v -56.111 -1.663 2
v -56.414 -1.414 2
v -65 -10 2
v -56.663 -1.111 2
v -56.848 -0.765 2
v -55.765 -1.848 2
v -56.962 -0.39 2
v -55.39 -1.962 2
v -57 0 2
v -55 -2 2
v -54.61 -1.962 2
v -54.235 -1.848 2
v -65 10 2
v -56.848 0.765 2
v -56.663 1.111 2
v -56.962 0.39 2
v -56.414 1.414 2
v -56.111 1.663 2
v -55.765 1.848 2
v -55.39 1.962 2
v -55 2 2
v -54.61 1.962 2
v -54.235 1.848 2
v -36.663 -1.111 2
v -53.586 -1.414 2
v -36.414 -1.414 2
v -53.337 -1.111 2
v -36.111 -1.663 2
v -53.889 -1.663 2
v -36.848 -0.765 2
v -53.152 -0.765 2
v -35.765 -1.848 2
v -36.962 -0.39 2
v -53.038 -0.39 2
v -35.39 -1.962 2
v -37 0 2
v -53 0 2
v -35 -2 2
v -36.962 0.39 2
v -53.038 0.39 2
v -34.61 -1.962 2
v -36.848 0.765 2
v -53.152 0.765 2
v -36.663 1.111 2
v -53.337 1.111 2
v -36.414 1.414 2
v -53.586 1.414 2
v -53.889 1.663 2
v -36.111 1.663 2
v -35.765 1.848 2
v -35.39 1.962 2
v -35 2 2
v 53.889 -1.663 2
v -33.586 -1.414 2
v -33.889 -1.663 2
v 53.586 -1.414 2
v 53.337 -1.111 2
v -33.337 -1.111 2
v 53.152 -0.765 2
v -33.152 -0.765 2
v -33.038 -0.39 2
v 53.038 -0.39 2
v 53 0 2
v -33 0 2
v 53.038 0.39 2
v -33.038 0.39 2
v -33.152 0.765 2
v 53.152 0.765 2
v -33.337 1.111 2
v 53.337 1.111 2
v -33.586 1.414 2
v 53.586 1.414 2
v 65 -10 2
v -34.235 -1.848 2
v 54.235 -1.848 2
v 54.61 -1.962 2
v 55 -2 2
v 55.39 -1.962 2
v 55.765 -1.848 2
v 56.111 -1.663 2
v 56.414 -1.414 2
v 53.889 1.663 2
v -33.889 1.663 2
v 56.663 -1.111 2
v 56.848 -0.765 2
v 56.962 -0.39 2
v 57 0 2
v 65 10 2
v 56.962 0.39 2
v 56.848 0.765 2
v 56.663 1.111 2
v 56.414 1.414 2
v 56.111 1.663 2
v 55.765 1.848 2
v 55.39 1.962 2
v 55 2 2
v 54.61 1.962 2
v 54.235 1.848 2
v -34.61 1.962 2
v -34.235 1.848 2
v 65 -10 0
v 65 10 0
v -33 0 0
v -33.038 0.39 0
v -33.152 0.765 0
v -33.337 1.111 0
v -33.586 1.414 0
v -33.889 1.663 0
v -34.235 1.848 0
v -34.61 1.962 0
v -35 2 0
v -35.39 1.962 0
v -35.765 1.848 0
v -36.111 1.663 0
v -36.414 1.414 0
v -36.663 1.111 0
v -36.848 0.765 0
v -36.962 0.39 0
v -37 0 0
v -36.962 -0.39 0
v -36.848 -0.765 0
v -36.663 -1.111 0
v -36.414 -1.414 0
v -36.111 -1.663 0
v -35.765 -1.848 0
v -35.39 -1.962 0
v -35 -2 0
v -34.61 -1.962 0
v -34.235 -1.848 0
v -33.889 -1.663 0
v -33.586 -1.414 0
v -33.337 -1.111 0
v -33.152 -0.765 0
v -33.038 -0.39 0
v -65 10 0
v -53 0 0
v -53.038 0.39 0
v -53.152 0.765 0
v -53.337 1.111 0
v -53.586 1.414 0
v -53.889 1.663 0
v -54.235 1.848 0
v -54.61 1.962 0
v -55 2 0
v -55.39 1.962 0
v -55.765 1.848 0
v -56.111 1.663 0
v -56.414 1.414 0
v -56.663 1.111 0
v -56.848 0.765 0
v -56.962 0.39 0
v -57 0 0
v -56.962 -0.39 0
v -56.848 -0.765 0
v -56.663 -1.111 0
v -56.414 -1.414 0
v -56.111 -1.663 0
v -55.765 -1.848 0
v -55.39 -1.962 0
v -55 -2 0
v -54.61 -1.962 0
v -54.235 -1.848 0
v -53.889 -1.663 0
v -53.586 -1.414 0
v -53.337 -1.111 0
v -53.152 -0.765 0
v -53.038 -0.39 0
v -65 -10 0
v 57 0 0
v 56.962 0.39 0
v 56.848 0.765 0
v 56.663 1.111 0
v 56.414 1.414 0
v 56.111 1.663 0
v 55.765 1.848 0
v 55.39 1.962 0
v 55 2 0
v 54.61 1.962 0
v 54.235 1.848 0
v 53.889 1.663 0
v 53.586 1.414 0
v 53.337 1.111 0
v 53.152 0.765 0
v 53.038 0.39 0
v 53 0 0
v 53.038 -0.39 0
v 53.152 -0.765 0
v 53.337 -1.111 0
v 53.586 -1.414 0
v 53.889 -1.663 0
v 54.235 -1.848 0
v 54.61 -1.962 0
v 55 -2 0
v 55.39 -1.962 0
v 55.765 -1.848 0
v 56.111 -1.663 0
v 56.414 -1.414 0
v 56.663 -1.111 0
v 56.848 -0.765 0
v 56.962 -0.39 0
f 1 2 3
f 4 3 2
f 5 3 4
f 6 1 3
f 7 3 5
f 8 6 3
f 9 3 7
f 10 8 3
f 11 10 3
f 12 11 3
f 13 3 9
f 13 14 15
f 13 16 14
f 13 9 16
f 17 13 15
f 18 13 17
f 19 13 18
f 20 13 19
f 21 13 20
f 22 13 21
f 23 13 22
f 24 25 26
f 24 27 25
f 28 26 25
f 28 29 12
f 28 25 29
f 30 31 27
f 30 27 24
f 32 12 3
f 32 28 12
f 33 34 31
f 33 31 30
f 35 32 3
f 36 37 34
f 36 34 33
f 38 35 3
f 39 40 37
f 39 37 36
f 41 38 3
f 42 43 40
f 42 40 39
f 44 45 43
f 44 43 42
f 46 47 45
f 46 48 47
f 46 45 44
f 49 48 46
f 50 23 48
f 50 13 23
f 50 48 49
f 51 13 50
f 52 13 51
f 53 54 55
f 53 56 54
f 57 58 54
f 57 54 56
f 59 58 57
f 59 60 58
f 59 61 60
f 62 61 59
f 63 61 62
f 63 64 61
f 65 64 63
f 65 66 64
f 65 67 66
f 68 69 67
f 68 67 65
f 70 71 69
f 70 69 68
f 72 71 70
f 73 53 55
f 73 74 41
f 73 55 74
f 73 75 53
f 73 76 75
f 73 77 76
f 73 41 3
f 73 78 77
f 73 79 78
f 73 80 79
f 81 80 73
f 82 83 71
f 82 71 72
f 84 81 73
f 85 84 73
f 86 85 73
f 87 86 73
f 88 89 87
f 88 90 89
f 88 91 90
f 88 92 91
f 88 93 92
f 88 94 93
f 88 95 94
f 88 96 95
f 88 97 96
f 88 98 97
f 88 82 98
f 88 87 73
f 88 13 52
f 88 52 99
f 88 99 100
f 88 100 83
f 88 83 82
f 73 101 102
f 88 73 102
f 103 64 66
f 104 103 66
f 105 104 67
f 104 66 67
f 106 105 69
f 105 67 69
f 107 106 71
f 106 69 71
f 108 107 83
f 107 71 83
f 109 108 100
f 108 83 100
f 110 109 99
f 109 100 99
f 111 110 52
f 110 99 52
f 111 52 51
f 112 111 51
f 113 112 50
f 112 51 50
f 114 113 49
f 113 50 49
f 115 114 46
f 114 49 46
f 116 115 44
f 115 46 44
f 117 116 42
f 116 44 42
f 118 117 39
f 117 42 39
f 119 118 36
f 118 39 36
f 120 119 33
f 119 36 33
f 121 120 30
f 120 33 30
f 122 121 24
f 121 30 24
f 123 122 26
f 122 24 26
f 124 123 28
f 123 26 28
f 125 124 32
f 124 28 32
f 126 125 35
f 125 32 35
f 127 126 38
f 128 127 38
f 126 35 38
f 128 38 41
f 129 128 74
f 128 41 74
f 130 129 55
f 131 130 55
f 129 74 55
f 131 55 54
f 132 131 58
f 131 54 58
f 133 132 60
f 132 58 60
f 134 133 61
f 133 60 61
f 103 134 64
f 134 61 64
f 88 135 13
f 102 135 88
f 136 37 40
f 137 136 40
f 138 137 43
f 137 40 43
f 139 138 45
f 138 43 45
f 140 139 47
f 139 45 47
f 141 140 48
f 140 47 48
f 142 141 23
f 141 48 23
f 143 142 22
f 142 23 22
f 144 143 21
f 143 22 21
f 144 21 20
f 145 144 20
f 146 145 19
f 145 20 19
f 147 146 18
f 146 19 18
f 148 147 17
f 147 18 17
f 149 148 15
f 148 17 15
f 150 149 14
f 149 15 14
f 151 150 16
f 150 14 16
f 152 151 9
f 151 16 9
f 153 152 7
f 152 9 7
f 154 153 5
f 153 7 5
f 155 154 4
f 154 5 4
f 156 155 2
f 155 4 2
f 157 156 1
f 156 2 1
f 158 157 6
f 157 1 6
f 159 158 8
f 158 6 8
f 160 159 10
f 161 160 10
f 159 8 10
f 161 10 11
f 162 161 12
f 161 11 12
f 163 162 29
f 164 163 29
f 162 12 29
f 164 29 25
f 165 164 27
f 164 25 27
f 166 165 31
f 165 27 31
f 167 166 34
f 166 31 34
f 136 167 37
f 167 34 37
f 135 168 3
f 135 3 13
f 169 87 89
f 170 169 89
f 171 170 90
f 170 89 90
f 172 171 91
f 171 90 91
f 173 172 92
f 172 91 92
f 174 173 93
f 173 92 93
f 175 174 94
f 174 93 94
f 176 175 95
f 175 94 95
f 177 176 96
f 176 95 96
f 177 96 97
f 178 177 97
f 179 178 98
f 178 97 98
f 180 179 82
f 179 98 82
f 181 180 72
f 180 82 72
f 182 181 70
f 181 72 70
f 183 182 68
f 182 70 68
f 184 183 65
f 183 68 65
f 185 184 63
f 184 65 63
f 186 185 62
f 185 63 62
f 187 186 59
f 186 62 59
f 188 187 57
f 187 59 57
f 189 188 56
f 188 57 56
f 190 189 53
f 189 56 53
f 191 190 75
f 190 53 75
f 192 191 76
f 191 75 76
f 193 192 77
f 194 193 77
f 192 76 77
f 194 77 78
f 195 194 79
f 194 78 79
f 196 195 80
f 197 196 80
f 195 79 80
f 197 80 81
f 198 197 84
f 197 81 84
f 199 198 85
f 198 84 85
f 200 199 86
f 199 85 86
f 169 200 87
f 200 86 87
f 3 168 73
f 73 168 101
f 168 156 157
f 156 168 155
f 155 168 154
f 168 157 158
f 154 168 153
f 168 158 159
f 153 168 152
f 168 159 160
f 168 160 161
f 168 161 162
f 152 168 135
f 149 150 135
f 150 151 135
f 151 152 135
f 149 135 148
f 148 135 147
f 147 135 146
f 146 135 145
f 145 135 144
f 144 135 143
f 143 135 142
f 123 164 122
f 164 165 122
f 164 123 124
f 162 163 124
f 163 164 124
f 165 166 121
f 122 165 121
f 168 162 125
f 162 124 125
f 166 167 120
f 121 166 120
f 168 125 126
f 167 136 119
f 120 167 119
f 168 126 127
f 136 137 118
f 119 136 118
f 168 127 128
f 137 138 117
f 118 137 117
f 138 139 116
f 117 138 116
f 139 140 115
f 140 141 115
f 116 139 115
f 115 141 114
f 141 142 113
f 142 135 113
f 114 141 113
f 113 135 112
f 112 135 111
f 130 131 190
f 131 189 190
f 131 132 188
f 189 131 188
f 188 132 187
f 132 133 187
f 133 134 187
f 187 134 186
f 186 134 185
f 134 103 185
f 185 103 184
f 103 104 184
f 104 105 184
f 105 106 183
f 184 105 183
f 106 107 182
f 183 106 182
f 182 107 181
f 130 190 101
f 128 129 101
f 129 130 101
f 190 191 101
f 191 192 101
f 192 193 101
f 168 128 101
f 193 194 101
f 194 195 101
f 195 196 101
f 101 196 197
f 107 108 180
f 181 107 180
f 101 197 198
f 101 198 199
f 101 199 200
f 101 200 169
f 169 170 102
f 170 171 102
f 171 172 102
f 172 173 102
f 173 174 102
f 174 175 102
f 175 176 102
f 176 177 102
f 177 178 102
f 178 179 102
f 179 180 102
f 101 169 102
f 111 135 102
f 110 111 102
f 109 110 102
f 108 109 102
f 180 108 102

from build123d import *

# Parameters (mm, degrees)
SKETCH1_W           = 130
SKETCH1_H           = 20
BOSS_EXTRUDE1_DEPTH = 2
SKETCH2_R           = 2
CUT_EXTRUDE1_DEPTH  = 2
SKETCH3_R           = 2
CUT_EXTRUDE2_DEPTH  = 2


with BuildPart() as part:
    # Sketch1 → Boss-Extrude1 (new body)
    with BuildSketch(Plane.XY):
        Rectangle(SKETCH1_W, SKETCH1_H)
    extrude(amount=BOSS_EXTRUDE1_DEPTH)

    # Sketch2 → Cut-Extrude1 (cut)
    with BuildSketch(Plane.XY.offset(2)):
        with Locations((-55, 0)):
            Circle(SKETCH2_R)
        with Locations((55, 0)):
            Circle(SKETCH2_R)
    extrude(amount=-CUT_EXTRUDE1_DEPTH, mode=Mode.SUBTRACT)

    # Sketch3 → Cut-Extrude2 (cut)
    with BuildSketch(Plane.XY.offset(2)):
        with Locations((-35, 0)):
            Circle(SKETCH3_R)
    extrude(amount=-CUT_EXTRUDE2_DEPTH, mode=Mode.SUBTRACT)


solid = part.part
